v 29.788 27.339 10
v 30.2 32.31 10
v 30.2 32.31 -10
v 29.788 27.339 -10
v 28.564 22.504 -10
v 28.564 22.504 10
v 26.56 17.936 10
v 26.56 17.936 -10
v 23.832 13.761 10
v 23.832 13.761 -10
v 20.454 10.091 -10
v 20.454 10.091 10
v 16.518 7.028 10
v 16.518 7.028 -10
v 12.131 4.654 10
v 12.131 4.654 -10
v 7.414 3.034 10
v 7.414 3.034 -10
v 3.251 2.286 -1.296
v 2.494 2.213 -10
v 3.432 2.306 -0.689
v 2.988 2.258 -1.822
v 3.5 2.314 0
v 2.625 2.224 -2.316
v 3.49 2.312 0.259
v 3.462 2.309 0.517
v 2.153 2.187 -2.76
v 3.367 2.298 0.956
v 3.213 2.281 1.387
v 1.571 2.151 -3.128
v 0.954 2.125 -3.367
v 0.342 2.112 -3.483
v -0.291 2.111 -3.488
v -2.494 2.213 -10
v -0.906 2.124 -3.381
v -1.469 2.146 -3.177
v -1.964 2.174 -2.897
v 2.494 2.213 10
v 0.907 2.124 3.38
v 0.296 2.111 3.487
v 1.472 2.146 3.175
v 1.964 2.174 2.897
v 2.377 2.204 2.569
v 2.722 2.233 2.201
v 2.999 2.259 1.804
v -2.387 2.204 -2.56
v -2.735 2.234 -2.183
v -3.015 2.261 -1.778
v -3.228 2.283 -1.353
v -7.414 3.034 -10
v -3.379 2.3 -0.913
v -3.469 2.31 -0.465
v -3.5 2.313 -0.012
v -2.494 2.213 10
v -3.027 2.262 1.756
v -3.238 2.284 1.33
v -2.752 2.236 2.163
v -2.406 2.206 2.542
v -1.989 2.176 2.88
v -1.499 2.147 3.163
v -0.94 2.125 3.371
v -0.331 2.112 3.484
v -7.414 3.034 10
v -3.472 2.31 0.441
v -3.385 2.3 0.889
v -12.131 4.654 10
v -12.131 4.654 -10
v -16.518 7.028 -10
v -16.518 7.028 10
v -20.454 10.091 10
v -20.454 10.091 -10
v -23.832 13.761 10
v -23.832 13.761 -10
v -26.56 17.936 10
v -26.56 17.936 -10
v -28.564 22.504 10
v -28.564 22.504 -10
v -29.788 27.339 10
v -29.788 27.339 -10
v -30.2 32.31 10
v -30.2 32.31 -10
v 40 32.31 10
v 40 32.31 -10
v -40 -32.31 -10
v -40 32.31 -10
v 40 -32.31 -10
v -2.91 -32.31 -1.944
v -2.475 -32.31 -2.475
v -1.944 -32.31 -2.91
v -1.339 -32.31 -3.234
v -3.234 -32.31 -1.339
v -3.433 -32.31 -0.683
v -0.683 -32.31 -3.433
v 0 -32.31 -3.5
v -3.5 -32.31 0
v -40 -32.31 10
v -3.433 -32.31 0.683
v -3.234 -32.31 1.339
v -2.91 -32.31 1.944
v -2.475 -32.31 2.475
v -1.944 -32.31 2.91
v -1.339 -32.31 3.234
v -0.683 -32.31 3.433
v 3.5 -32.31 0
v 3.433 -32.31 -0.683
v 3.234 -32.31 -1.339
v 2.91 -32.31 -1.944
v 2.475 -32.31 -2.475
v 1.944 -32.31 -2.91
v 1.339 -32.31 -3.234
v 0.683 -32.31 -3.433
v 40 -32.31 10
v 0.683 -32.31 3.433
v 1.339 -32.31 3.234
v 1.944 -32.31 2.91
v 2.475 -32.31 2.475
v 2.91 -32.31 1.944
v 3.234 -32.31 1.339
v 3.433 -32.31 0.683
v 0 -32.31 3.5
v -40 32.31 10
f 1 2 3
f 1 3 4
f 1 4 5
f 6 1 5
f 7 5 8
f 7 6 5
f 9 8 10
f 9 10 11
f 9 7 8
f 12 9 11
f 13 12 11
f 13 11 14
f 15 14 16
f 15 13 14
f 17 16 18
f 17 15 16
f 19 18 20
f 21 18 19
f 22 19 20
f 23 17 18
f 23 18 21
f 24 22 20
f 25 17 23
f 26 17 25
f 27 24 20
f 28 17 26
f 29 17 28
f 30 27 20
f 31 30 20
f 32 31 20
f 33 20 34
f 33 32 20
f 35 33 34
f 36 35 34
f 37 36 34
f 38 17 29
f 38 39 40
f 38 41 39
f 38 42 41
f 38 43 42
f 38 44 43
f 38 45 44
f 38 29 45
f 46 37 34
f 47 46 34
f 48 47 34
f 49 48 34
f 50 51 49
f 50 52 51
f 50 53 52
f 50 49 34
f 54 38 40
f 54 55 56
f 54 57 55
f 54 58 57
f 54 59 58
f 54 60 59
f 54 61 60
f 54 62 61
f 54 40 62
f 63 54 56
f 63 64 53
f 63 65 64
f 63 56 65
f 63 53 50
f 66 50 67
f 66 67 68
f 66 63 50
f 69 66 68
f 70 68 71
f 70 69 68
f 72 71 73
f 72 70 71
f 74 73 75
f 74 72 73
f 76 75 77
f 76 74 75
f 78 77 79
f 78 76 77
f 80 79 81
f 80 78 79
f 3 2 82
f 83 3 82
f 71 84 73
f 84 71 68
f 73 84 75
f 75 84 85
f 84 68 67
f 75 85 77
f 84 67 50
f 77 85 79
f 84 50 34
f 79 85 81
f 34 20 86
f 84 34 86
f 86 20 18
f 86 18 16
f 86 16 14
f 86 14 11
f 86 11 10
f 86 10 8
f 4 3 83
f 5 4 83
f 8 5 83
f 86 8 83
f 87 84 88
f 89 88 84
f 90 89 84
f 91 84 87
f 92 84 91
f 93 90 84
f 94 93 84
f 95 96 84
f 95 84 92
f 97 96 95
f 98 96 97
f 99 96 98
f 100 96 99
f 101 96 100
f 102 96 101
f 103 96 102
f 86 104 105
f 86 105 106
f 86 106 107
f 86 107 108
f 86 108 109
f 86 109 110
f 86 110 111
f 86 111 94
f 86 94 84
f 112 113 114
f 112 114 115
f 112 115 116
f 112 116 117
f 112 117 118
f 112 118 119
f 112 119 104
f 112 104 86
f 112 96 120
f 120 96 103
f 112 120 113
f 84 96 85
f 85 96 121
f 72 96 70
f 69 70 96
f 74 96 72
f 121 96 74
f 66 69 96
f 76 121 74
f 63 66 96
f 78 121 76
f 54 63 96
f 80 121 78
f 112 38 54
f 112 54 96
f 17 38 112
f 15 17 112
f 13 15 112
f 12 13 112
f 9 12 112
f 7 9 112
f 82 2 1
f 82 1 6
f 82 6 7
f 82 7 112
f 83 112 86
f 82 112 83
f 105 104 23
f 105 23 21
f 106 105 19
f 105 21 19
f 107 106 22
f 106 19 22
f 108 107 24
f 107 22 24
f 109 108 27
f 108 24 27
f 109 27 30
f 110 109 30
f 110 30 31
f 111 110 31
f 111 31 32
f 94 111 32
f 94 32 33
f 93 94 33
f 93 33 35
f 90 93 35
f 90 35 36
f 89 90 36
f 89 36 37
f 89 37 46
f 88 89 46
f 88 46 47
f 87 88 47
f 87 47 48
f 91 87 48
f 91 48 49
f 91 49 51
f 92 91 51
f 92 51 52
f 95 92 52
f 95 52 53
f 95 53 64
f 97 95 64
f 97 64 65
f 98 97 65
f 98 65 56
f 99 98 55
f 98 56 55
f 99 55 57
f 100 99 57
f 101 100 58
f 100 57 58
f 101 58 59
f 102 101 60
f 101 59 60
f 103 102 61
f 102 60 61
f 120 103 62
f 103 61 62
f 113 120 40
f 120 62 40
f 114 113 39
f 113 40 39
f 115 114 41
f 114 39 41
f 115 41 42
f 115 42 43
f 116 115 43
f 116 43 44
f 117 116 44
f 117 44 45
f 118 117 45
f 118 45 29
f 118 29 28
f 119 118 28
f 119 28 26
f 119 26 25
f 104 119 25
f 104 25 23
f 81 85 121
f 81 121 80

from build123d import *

# Parameters (mm, degrees)
SKETCH1_W            = 80
SKETCH1_H            = 64.62
BOSS_EXTRUDE1_DEPTH  = 10
CUT_EXTRUDE1_DEPTH   = 20
M6_CLEARANCE_HOLE1_D = 7


with BuildPart() as part:
    # Sketch1 → Boss-Extrude1 (new body, symmetric)
    with BuildSketch(Plane.XY):
        Rectangle(SKETCH1_W, SKETCH1_H)
    extrude(amount=BOSS_EXTRUDE1_DEPTH, both=True)

    # Sketch2 → Cut-Extrude1 (cut)
    with BuildSketch(Plane.XY.offset(10)):
        with BuildLine():
            Line((-30.2, 32.31), (30.2, 32.31))
            ThreePointArc((30.2, 32.31), (0, 2.11), (-30.2, 32.31))
        make_face()
    extrude(amount=-CUT_EXTRUDE1_DEPTH, mode=Mode.SUBTRACT)

    # M6 Clearance Hole1 (through all)
    with Locations(Plane(origin=(0, -32.31, 0), x_dir=(-1, 0, 0), z_dir=(0, -1, 0))):
        with Locations((0, 0)):
            Hole(M6_CLEARANCE_HOLE1_D / 2)


solid = part.part
